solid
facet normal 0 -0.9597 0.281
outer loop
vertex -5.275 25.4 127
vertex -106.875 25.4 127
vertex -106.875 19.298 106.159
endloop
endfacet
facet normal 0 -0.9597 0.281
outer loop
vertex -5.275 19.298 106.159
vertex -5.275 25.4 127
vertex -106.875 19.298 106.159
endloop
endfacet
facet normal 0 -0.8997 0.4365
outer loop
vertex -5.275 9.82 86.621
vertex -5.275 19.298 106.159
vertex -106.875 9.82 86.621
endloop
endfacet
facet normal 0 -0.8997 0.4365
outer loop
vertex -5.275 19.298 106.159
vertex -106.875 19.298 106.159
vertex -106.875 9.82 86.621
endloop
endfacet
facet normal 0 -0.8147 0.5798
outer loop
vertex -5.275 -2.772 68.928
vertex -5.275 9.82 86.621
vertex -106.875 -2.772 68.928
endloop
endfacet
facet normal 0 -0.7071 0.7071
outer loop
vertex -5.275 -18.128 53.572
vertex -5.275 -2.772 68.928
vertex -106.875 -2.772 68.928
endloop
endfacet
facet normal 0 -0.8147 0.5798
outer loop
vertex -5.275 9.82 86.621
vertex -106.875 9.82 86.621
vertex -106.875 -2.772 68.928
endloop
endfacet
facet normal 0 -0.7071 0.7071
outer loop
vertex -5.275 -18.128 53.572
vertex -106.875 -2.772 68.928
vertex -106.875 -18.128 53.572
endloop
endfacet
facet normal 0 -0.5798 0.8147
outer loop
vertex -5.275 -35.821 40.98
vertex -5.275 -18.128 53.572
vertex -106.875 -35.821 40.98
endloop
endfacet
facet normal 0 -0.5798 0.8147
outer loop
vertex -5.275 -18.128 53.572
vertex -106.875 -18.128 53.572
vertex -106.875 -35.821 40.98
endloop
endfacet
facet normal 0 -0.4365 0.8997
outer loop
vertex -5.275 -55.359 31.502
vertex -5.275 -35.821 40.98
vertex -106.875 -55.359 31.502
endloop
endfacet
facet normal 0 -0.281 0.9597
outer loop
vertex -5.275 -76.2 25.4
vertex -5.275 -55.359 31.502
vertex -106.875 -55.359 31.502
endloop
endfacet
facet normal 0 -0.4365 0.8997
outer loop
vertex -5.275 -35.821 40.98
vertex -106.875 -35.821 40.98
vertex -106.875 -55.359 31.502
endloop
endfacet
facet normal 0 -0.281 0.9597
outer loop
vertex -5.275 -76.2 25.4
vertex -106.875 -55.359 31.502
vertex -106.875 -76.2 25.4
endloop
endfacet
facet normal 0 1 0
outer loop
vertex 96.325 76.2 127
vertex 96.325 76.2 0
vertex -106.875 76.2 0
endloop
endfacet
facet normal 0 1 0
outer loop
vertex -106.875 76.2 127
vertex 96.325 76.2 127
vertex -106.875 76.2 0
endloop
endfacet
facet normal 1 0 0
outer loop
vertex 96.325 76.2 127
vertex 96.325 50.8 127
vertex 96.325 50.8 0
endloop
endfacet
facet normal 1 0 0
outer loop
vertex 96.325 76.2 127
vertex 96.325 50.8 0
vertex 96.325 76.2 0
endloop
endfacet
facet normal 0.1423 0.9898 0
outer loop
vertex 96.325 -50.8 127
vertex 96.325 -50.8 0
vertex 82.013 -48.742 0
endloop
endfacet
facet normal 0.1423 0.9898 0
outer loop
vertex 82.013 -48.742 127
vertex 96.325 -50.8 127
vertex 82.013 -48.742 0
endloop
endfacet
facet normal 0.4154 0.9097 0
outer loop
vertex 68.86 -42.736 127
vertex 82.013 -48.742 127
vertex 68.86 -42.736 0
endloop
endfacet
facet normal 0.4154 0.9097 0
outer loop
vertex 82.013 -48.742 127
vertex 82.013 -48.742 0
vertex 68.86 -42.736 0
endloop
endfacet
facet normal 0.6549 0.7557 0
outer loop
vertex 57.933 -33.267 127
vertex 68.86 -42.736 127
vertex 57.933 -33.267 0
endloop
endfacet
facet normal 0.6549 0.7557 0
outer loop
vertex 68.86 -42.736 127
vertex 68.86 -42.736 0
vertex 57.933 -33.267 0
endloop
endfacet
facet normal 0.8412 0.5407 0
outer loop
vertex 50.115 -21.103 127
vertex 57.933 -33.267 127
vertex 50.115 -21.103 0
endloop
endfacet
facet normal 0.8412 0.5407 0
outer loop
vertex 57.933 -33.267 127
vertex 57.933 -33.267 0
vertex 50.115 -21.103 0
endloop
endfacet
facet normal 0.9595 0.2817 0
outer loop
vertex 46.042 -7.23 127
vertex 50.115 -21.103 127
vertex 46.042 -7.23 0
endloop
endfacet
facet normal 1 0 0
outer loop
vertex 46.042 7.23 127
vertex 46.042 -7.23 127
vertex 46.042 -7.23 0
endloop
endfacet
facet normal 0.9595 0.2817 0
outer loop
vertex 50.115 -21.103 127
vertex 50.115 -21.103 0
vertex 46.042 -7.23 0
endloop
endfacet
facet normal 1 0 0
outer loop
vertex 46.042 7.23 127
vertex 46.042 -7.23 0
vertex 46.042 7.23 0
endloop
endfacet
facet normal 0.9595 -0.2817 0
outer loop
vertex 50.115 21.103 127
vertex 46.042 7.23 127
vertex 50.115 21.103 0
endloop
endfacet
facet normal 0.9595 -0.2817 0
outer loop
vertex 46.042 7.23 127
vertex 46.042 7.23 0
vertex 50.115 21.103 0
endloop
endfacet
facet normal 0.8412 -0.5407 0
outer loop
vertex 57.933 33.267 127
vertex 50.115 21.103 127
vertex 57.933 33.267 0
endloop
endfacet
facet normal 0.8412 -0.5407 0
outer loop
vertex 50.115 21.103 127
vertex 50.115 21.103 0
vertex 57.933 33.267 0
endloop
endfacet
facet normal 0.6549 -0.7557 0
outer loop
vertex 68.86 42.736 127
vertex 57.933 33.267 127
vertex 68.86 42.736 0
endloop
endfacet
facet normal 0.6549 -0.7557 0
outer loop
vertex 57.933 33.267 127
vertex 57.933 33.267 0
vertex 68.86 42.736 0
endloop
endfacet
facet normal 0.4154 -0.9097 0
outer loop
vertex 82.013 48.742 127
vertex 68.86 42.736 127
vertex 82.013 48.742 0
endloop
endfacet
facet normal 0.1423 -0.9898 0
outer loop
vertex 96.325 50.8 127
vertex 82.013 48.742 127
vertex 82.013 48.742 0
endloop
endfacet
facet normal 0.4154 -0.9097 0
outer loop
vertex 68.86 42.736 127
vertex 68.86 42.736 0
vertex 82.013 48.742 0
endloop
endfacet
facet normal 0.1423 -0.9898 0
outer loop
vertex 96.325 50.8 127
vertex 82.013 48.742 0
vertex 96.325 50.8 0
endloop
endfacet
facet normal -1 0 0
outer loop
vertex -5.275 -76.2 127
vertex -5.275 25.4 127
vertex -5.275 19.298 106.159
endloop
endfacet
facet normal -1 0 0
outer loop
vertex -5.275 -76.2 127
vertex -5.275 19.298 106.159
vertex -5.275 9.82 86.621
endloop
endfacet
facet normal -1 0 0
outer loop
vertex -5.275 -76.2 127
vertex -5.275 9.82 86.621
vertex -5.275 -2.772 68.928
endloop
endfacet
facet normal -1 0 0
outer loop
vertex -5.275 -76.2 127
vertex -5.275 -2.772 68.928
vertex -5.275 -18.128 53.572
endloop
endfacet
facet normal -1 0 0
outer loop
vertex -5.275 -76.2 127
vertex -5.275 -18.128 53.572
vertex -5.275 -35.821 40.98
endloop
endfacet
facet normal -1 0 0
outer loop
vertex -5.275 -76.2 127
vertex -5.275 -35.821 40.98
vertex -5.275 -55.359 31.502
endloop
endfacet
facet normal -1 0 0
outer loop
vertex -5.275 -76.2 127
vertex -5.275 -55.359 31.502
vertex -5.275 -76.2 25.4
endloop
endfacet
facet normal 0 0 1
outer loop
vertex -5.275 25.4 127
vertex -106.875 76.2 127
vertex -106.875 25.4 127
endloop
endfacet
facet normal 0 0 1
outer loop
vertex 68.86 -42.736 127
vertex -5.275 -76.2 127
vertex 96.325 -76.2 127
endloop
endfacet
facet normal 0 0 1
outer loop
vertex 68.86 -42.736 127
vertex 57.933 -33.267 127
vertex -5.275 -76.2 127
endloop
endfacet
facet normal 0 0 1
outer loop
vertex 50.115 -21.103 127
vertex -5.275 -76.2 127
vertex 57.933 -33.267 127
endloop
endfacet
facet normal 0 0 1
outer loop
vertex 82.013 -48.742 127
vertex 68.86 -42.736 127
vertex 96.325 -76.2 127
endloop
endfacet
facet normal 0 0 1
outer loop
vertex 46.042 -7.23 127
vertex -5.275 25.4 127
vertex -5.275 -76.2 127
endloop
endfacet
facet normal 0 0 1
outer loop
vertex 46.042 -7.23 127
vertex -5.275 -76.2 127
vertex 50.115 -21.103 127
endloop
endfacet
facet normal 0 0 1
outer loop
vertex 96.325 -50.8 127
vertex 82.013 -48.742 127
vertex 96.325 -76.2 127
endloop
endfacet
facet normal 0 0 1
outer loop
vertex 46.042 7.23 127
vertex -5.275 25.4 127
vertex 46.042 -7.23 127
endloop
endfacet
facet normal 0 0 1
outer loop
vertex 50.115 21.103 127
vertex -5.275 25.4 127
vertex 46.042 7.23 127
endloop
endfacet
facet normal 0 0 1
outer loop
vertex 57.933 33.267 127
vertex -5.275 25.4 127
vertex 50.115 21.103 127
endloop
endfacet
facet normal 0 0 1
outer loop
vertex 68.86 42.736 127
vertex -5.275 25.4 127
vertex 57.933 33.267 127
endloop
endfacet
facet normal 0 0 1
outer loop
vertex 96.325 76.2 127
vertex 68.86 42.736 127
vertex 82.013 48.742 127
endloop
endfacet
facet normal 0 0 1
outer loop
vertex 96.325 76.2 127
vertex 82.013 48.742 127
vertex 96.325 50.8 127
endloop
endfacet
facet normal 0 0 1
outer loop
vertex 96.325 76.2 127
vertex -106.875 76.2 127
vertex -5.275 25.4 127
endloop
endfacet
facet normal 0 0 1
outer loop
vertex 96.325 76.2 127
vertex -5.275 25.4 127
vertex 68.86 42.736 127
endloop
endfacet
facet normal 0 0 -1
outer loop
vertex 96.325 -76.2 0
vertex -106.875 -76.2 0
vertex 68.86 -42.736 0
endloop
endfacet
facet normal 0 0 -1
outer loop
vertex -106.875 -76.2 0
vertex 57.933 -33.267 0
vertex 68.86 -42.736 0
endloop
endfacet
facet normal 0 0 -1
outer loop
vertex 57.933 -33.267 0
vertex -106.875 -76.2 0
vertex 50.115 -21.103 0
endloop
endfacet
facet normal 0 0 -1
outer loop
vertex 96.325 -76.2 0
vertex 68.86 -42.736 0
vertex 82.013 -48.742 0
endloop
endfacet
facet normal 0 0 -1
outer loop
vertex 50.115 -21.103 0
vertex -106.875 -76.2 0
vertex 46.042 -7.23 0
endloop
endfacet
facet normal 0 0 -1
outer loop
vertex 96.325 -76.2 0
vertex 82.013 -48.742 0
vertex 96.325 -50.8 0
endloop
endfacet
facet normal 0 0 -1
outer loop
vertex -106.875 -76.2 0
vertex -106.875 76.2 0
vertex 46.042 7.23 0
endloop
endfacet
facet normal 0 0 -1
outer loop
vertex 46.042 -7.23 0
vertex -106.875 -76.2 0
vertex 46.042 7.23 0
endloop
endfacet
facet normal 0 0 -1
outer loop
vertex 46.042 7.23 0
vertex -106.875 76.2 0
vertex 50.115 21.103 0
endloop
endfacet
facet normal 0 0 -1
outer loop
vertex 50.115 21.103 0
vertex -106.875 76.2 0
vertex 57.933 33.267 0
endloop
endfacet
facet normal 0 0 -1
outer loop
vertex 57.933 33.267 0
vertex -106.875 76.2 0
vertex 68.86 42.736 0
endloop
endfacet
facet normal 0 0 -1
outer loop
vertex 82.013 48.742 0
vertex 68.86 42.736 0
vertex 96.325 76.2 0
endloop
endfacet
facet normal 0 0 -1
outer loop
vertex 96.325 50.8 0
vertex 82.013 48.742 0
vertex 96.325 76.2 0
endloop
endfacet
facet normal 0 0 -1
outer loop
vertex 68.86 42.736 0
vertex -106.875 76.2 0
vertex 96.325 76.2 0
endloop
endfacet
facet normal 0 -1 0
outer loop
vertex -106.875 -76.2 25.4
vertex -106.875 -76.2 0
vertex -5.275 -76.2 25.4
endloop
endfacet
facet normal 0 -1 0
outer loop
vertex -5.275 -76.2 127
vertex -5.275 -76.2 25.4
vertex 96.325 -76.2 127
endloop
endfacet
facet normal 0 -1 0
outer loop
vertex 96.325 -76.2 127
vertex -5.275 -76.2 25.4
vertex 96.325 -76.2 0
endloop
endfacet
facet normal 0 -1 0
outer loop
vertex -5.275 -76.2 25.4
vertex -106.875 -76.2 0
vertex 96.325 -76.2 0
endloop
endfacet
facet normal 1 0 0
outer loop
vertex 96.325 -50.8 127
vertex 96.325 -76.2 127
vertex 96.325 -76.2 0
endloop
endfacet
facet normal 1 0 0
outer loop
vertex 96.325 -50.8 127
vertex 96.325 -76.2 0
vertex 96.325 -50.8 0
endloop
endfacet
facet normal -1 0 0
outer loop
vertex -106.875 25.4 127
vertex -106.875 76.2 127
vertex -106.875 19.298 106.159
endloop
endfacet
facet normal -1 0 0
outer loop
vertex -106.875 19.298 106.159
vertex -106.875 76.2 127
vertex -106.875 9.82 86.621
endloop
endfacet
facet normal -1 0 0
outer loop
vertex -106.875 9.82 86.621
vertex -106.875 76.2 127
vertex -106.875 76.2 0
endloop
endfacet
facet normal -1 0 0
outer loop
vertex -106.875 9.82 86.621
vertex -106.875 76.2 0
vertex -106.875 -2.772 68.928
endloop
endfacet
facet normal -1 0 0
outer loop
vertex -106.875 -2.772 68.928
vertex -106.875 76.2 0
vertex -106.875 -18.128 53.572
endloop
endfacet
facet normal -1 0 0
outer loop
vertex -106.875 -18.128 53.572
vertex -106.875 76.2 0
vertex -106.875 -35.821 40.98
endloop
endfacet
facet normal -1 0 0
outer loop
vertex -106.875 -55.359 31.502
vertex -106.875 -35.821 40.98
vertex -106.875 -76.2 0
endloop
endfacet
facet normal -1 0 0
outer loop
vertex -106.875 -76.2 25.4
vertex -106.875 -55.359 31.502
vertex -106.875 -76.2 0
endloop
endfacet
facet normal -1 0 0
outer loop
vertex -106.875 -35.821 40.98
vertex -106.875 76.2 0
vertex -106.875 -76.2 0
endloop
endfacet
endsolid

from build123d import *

# Parameters (mm, degrees)
F1_DEPTH = 127
F3_DEPTH = 101.6


with BuildPart() as f1:
    # F0 (on Top) → F1 (new body)
    with BuildSketch(Plane.XY):
        with BuildLine():
            Line((96.324614, 76.2), (-106.875386, 76.2))
            Line((-106.875386, 76.2), (-106.875386, -76.2))
            Line((-106.875386, -76.2), (96.324614, -76.2))
            Line((96.324614, -76.2), (96.324614, -50.8))
            ThreePointArc((96.324614, -50.8), (45.524614, 0), (96.324614, 50.8))
            Line((96.324614, 50.8), (96.324614, 76.2))
        make_face()
    extrude(amount=F1_DEPTH)

    # F2 (on face) → F3 (cut)
    with BuildSketch(Plane(origin=(-106.875386, 0, 0), x_dir=(0, -1, 0), z_dir=(-1, 0, 0))):
        with BuildLine():
            Line((76.2, 127), (-25.4, 127))
            ThreePointArc((-25.4, 127), (10.129609, 60.929609), (76.2, 25.4))
            Line((76.2, 25.4), (76.2, 127))
        make_face()
    extrude(amount=-F3_DEPTH, mode=Mode.SUBTRACT)


solid = f1.part
